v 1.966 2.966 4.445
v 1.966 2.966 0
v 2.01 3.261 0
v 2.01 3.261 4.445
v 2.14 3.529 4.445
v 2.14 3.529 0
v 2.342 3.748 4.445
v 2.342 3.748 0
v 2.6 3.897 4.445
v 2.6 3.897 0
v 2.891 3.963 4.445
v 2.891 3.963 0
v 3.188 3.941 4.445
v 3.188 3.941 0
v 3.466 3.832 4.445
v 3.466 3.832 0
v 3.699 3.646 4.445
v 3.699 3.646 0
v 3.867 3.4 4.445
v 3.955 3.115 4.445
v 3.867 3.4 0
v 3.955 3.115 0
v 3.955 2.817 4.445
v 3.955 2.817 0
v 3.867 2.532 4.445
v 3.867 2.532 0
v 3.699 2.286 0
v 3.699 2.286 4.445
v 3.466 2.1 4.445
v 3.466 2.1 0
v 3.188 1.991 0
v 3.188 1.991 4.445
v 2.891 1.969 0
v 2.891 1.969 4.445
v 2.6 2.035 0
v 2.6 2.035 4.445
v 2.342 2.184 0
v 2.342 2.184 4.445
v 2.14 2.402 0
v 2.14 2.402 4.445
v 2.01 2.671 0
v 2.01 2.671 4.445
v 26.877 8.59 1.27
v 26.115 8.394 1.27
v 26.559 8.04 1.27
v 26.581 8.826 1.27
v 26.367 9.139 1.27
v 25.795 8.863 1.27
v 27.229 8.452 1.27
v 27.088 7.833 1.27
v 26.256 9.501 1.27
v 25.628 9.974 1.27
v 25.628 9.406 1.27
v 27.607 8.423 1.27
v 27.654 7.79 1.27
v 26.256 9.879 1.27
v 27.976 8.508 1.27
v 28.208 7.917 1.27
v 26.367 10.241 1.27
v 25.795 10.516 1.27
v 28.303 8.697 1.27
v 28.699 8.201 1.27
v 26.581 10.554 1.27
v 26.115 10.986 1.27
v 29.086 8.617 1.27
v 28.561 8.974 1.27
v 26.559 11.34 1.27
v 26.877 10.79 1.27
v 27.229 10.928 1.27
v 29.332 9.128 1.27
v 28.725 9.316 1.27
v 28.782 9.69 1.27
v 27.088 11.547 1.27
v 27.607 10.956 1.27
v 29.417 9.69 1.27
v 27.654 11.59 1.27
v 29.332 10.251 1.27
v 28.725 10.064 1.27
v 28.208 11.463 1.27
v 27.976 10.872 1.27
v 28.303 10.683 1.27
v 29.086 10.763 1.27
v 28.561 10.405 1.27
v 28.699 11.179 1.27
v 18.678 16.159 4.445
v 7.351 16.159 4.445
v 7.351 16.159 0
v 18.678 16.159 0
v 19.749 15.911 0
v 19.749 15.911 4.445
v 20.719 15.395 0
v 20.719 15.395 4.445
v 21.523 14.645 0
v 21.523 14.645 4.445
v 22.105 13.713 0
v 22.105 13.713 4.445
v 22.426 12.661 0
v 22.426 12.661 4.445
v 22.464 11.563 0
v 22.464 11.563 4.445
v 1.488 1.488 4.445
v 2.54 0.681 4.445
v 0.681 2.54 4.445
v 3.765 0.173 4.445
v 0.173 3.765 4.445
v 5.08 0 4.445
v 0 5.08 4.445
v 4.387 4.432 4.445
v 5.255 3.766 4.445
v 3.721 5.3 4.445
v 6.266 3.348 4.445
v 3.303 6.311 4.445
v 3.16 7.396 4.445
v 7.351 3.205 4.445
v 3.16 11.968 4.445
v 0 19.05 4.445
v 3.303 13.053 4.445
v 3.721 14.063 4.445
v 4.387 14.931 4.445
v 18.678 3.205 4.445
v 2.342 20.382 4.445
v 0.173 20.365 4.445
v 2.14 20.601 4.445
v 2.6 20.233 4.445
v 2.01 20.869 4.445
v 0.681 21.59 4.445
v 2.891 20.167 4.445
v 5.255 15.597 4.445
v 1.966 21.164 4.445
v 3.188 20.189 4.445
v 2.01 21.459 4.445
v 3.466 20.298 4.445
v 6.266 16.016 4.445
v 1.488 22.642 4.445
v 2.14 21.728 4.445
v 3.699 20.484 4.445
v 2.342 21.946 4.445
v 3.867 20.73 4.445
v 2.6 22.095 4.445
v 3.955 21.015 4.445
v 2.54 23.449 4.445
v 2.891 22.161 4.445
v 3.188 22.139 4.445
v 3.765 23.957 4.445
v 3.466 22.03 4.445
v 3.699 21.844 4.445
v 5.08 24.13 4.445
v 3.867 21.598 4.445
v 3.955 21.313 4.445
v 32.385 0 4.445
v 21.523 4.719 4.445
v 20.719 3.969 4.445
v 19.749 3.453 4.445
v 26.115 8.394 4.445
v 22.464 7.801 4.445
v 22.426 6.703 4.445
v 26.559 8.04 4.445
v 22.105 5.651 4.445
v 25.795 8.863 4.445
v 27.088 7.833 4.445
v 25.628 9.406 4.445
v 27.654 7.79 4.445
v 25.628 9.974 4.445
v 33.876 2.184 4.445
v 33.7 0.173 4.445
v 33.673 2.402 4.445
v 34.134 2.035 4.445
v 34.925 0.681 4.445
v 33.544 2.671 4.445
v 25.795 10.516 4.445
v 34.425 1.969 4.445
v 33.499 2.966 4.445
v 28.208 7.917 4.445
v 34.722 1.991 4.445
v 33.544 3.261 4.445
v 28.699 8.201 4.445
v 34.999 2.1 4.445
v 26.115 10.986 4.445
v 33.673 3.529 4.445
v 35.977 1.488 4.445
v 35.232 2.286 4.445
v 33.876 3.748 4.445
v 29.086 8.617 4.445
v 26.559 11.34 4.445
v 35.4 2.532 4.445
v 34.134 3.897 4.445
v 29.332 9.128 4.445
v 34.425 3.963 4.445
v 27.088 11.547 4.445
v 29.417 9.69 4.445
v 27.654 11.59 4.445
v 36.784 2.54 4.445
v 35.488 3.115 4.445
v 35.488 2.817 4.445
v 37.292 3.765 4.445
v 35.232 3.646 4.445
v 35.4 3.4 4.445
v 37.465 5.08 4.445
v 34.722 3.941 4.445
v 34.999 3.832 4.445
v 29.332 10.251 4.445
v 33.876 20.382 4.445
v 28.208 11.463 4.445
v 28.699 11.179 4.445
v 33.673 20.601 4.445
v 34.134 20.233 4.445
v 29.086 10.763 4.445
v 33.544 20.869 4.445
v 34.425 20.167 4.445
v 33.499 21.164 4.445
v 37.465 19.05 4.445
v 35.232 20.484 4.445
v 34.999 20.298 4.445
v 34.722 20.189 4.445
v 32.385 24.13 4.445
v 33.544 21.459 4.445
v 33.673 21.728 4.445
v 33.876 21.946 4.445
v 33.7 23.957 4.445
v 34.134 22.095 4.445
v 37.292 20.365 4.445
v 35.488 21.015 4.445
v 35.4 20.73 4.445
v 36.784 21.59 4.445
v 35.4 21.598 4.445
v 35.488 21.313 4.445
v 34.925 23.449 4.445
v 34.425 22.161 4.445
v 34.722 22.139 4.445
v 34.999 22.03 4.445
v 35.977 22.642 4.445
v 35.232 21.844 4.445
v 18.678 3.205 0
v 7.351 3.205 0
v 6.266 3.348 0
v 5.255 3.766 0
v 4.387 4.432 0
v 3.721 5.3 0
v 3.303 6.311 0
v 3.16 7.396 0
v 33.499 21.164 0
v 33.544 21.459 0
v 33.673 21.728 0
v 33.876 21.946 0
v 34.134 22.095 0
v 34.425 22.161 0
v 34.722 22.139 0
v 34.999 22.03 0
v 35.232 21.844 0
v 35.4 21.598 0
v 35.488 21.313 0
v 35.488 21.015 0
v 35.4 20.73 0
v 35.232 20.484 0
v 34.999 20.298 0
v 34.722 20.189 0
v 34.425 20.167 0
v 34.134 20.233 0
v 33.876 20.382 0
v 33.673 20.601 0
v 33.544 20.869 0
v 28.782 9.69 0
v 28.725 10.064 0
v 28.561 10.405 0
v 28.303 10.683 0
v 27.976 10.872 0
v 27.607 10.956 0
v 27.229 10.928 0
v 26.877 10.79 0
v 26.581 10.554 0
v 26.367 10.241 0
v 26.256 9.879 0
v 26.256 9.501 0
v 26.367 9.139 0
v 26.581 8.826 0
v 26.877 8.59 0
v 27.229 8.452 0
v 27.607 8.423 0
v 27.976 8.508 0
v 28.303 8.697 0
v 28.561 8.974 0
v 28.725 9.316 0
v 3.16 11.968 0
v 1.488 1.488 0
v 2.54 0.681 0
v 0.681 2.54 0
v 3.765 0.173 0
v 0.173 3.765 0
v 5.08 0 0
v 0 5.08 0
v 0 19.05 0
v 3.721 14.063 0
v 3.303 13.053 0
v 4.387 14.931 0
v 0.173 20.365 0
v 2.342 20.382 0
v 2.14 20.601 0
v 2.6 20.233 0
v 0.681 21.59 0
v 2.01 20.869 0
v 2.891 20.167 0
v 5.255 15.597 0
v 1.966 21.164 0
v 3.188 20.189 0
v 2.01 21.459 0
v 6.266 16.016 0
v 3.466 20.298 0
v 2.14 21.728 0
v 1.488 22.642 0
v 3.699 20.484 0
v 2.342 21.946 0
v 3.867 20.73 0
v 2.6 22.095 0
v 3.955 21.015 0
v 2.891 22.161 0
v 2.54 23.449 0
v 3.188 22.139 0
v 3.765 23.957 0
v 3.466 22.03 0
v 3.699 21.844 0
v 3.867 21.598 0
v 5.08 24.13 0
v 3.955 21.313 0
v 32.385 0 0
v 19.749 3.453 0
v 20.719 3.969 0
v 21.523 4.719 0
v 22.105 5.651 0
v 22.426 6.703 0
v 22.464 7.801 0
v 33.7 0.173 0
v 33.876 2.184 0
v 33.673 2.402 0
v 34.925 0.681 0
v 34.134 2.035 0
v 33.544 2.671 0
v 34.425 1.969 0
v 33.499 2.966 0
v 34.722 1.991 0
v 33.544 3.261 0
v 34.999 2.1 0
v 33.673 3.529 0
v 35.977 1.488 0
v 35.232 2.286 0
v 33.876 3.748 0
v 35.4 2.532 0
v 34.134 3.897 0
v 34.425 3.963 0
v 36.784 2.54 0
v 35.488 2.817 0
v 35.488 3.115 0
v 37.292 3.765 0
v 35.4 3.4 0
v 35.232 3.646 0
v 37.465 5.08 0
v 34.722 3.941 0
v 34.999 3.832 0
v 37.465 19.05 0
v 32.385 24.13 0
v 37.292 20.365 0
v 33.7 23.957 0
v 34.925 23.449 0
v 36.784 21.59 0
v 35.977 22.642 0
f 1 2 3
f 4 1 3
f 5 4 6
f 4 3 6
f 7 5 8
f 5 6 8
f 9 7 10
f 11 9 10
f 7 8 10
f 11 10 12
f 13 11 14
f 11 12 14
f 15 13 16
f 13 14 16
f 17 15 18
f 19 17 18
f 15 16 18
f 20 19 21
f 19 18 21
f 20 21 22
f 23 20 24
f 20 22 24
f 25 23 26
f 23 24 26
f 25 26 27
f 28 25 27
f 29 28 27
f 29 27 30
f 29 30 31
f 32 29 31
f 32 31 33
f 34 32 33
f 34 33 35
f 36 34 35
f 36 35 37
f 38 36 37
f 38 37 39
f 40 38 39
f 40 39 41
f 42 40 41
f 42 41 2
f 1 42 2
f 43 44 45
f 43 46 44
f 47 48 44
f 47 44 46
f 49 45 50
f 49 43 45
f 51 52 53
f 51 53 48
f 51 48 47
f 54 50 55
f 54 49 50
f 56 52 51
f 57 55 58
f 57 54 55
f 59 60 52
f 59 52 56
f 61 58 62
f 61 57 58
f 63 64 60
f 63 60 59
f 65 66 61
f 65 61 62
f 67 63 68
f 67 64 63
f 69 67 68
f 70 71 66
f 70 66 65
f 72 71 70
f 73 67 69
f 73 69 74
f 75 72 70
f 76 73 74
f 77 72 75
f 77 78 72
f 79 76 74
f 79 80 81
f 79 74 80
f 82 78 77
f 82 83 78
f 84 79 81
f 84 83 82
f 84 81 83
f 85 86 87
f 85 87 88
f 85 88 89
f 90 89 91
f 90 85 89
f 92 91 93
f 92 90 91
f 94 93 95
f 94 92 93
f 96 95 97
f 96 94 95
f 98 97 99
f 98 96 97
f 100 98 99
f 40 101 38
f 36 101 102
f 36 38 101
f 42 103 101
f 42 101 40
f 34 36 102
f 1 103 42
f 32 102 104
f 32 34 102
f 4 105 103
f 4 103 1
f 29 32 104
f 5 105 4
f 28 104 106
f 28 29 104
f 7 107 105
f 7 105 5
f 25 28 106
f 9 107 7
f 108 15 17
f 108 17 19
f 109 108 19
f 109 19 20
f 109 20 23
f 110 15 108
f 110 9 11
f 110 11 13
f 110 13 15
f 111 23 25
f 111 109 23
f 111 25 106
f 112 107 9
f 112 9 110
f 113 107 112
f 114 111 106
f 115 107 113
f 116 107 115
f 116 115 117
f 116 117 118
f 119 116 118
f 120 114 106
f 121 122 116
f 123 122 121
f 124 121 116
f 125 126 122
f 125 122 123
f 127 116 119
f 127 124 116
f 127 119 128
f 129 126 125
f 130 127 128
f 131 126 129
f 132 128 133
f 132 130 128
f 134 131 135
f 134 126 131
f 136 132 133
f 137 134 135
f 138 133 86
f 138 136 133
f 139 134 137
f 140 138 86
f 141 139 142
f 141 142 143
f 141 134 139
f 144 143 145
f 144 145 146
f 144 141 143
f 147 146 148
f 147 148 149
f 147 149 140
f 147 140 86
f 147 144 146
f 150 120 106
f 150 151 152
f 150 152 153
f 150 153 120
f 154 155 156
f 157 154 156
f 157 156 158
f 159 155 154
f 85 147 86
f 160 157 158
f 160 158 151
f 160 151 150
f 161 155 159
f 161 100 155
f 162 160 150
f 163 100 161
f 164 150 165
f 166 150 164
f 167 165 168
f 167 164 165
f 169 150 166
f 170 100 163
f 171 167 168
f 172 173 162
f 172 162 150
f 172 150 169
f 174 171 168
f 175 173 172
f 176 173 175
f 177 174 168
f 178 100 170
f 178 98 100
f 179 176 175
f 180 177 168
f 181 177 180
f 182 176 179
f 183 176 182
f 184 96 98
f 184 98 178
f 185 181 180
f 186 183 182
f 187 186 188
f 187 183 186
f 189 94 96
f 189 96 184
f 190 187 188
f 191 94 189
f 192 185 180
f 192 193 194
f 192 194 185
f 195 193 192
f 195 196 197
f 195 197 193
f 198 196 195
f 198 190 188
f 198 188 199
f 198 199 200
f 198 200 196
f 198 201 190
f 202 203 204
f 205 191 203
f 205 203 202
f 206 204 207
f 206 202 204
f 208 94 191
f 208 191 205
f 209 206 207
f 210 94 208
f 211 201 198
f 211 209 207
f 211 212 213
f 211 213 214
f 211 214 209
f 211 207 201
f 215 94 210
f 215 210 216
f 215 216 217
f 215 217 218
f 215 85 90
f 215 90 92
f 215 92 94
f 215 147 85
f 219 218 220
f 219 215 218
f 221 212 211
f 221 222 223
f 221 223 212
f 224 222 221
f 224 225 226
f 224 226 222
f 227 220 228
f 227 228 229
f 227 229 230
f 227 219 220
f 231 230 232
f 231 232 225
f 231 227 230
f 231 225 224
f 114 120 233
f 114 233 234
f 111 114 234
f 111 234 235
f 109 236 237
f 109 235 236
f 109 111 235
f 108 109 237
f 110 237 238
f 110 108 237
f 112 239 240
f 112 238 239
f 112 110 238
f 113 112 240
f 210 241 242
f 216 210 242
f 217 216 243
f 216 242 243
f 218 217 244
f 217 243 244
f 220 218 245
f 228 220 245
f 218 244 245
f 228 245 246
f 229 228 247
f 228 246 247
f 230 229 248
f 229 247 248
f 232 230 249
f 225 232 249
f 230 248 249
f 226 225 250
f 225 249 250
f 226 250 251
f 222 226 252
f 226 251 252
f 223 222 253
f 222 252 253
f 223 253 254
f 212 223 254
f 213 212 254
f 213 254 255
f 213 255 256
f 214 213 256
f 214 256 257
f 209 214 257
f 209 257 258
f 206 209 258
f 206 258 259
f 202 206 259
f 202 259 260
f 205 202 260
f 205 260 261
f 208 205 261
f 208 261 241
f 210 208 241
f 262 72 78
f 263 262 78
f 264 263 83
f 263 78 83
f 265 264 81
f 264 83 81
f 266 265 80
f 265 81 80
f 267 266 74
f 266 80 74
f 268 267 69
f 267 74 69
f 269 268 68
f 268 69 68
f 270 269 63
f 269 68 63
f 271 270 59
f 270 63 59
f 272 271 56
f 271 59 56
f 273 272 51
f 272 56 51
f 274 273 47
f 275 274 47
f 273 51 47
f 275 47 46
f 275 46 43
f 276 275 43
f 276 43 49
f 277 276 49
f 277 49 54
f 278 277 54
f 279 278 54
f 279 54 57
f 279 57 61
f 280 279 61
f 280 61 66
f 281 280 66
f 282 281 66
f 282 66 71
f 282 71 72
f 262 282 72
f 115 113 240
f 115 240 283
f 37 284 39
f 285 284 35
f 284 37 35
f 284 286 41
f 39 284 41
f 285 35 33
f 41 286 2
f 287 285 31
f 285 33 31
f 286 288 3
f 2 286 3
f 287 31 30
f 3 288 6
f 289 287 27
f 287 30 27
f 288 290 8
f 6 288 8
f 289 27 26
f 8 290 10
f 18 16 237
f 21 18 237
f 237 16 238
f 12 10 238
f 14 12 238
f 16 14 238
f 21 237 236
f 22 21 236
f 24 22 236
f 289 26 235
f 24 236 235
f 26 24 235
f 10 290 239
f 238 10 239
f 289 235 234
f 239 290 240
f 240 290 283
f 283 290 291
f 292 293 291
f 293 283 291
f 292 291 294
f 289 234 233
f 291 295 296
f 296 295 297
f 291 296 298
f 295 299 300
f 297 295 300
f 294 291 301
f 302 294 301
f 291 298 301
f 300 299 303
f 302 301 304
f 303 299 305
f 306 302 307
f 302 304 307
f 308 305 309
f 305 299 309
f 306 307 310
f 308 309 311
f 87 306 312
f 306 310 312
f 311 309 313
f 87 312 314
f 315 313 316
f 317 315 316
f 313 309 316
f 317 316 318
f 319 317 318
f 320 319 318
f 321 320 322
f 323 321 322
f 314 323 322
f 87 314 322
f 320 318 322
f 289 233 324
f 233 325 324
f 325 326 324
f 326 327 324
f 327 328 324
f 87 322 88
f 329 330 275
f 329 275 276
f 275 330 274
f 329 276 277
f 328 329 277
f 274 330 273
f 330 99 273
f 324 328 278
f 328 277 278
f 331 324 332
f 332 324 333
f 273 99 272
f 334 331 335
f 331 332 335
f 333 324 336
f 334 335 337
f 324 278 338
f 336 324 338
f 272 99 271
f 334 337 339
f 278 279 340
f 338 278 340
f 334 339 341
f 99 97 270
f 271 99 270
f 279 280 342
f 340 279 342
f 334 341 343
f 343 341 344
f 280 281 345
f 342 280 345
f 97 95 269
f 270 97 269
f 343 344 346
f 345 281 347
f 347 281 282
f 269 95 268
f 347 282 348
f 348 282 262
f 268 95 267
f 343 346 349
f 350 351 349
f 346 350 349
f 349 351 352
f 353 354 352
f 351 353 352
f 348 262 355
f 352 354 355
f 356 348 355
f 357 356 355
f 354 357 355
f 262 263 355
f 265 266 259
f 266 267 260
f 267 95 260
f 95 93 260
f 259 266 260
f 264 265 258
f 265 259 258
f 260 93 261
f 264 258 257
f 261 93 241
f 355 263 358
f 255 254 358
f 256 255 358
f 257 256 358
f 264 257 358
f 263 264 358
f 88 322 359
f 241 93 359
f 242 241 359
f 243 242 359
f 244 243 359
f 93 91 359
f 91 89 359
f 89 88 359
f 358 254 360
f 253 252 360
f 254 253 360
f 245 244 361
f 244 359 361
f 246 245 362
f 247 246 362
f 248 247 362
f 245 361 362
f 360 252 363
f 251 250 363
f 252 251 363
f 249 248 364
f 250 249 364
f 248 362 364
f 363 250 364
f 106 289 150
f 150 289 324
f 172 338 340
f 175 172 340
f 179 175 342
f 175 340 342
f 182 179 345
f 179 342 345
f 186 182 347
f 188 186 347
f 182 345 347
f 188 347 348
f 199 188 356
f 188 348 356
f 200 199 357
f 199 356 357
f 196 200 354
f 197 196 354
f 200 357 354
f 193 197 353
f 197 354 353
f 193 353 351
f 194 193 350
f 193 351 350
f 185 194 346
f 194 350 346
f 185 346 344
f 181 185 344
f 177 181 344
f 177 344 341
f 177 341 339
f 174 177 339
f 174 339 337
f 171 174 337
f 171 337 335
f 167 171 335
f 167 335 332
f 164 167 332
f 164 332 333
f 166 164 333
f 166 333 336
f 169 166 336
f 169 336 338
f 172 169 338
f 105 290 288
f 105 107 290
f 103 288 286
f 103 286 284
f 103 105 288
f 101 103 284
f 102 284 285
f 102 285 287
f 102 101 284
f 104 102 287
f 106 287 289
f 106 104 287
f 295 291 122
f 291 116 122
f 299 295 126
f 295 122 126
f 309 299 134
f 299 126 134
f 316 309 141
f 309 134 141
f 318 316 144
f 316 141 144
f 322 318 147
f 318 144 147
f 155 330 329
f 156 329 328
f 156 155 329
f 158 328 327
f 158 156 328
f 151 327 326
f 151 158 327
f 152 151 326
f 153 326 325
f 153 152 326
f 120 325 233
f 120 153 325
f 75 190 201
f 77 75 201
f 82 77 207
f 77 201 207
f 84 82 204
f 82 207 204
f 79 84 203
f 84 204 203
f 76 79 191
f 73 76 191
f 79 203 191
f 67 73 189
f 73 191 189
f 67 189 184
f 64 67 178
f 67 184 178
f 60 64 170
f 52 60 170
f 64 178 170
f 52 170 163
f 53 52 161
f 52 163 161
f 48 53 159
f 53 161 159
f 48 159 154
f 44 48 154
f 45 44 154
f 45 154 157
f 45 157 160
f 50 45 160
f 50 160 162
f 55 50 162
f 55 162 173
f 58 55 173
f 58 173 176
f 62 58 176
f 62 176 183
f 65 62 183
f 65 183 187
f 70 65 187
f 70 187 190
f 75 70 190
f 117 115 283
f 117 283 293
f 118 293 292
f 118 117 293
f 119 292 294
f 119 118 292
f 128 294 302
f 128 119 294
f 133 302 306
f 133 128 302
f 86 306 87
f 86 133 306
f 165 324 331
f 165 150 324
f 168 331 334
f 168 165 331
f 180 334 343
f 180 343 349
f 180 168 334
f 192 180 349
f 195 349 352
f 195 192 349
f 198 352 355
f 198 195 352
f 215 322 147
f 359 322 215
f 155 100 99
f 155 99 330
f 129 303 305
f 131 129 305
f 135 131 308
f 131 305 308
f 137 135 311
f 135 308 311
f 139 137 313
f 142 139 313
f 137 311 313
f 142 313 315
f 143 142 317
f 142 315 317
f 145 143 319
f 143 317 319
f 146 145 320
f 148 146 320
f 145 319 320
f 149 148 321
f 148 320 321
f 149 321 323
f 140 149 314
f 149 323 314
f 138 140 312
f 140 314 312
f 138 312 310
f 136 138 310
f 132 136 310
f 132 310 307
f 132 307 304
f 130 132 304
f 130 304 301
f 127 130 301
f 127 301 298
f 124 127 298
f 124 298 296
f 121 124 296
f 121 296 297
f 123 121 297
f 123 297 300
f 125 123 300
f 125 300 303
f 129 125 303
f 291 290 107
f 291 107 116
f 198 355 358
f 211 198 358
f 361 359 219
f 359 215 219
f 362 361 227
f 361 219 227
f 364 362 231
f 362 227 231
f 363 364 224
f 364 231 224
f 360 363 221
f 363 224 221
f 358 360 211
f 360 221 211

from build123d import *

# Parameters (mm, degrees)
SKETCH1_W           = 37.465
SKETCH1_H           = 24.13
BOSS_EXTRUDE1_DEPTH = 4.445
CUT_EXTRUDE2_DEPTH  = 2.54
FILLET1_R           = 5.08
CUT_EXTRUDE4_DEPTH  = 2.54
SKETCH4_R           = 1.27
CUT_EXTRUDE5_DEPTH  = 2.54
SKETCH5_R           = 1.905
SKETCH5_R_2         = 1.27
CUT_EXTRUDE6_DEPTH  = 0.635
CUT_EXTRUDE7_DEPTH  = 2.54
BOSS_EXTRUDE2_START = 2.54
SKETCH7_R           = 1.905
BOSS_EXTRUDE2_DEPTH = 2.54
SKETCH8_R           = 1
CUT_EXTRUDE8_DEPTH  = 45.784385114


with BuildPart() as part:
    # Sketch1 → Boss-Extrude1 (new body)
    with BuildSketch(Plane.XY):
        with Locations((18.7325, 12.065)):
            Rectangle(SKETCH1_W, SKETCH1_H)
    extrude(amount=BOSS_EXTRUDE1_DEPTH)

    # Sketch2 → Cut-Extrude2 (cut)
    # profile 1 of 4: a face of its own
    with BuildSketch(Plane.XY.offset(4.445)):
        with BuildLine():
            Line((35.59175, 5.7785), (35.59175, 12.065))
            Line((35.59175, 12.065), (35.59175, 18.3515))
            ThreePointArc((35.59175, 18.3515), (34.135361545, 21.710109865), (30.681521372, 22.9235))
            Line((30.681521372, 22.9235), (18.7325, 22.9235))
            Line((18.7325, 22.9235), (6.107021372, 22.9235))
            ThreePointArc((6.107021372, 22.9235), (3.090639267, 21.470453234), (1.87325, 18.3515))
            Line((1.87325, 18.3515), (1.87325, 12.065))
            Line((1.87325, 12.065), (1.87325, 5.7785))
            ThreePointArc((1.87325, 5.7785), (3.212357796, 2.545607796), (6.44525, 1.2065))
            Line((6.44525, 1.2065), (18.7325, 1.2065))
            Line((18.7325, 1.2065), (31.01975, 1.2065))
            ThreePointArc((31.01975, 1.2065), (34.252642204, 2.545607796), (35.59175, 5.7785))
        make_face()
        with BuildLine():
            ThreePointArc((7.493, 3.175), (4.439712919, 4.439712919), (3.175, 7.493))
            Line((3.175, 7.493), (3.175, 16.637))
            ThreePointArc((3.175, 16.637), (4.317872951, 19.576666289), (7.154771372, 20.955))
            Line((7.154771372, 20.955), (7.493, 20.955))
            Line((7.493, 20.955), (29.633771372, 20.955))
            ThreePointArc((29.633771372, 20.955), (32.908147923, 19.81638289), (34.29, 16.637))
            Line((34.29, 16.637), (34.29, 7.493))
            ThreePointArc((34.29, 7.493), (33.025287081, 4.439712919), (29.972, 3.175))
            Line((29.972, 3.175), (7.493, 3.175))
        make_face(mode=Mode.SUBTRACT)
    # profile 2 of 4: a face of its own
    with BuildSketch(Plane.XY.offset(4.445)):
        with BuildLine():
            ThreePointArc((3.175, 16.637), (4.439712919, 19.690287081), (7.493, 20.955))
            Line((7.493, 20.955), (29.972, 20.955))
            ThreePointArc((29.972, 20.955), (33.025287081, 19.690287081), (34.29, 16.637))
            Line((34.29, 16.637), (34.29, 7.493))
            ThreePointArc((34.29, 7.493), (33.025287081, 4.439712919), (29.972, 3.175))
            Line((29.972, 3.175), (7.493, 3.175))
            ThreePointArc((7.493, 3.175), (4.439712919, 4.439712919), (3.175, 7.493))
            Line((3.175, 7.493), (3.175, 16.637))
        make_face()
    # profile 3 of 4: a face of its own
    with BuildSketch(Plane.XY.offset(4.445)):
        with BuildLine():
            ThreePointArc((7.154771372, 20.955), (4.317872951, 19.576666289), (3.175, 16.637))
            ThreePointArc((3.175, 16.637), (4.439712919, 19.690287081), (7.493, 20.955))
            Line((7.493, 20.955), (7.154771372, 20.955))
        make_face()
    # profile 4 of 4: a face of its own
    with BuildSketch(Plane.XY.offset(4.445)):
        with BuildLine():
            ThreePointArc((34.29, 16.637), (32.908147923, 19.81638289), (29.633771372, 20.955))
            Line((29.633771372, 20.955), (29.972, 20.955))
            ThreePointArc((29.972, 20.955), (33.025287081, 19.690287081), (34.29, 16.637))
        make_face()
    extrude(amount=-CUT_EXTRUDE2_DEPTH, mode=Mode.SUBTRACT)

    # Fillet1
    fillet1_edges = [part.edges().sort_by_distance(p)[0] for p in [
        (0, 24.13, 2.2225),
        (37.465, 24.13, 2.2225),
        (37.465, 0, 2.2225),
        (0, 0, 2.2225),
    ]]
    fillet(fillet1_edges, radius=FILLET1_R)

    # Sketch3 → Cut-Extrude4 (cut)
    with BuildSketch(Plane.XY.offset(1.905)):
        with BuildLine():
            Line((7.350869654, 16.158973759), (18.677995313, 16.158973759))
            ThreePointArc((18.677995313, 16.158973759), (21.522821275, 14.644991178), (22.463869654, 11.5628481))
            Line((22.463869654, 11.5628481), (22.463869654, 7.801099417))
            ThreePointArc((22.463869654, 7.801099417), (21.522821275, 4.718956339), (18.677995313, 3.204973759))
            Line((18.677995313, 3.204973759), (7.350869654, 3.204973759))
            ThreePointArc((7.350869654, 3.204973759), (4.387385134, 4.432489239), (3.159869654, 7.395973759))
            Line((3.159869654, 7.395973759), (3.159869654, 11.967973759))
            ThreePointArc((3.159869654, 11.967973759), (4.387385134, 14.931458278), (7.350869654, 16.158973759))
        make_face()
    extrude(amount=-CUT_EXTRUDE4_DEPTH, mode=Mode.SUBTRACT)

    # Sketch4 → Cut-Extrude5 (cut)
    with BuildSketch(Plane.XY.offset(1.905)):
        with Locations((27.511650569, 9.68988988)):
            Circle(SKETCH4_R)
    extrude(amount=-CUT_EXTRUDE5_DEPTH, mode=Mode.SUBTRACT)

    # Sketch5 → Cut-Extrude6 (cut)
    with BuildSketch(Plane.XY.offset(1.905)):
        with Locations((27.511650569, 9.68988988)):
            Circle(SKETCH5_R)
        with Locations((27.511650569, 9.68988988)):
            Circle(SKETCH5_R_2, mode=Mode.SUBTRACT)
    extrude(amount=-CUT_EXTRUDE6_DEPTH, mode=Mode.SUBTRACT)

    # Sketch6 → Cut-Extrude7 (cut)
    with BuildSketch(Plane.XY.offset(4.445)):
        with BuildLine():
            Line((1.542829573, 18.47723), (1.542829573, 5.65277))
            ThreePointArc((1.542829573, 5.65277), (2.908719525, 2.355219952), (6.206269573, 0.98933))
            Line((6.206269573, 0.98933), (31.272259573, 0.98933))
            ThreePointArc((31.272259573, 0.98933), (34.56980962, 2.355219952), (35.935699573, 5.65277))
            Line((35.935699573, 5.65277), (35.935699573, 18.47723))
            ThreePointArc((35.935699573, 18.47723), (34.450183348, 21.903012063), (30.927266372, 23.14067))
            Line((30.927266372, 23.14067), (5.861276372, 23.14067))
            ThreePointArc((5.861276372, 23.14067), (2.784566625, 21.658562299), (1.542829573, 18.47723))
        make_face()
        with BuildLine():
            Line((6.44525, 1.2065), (31.01975, 1.2065))
            ThreePointArc((31.01975, 1.2065), (34.252642204, 2.545607796), (35.59175, 5.7785))
            Line((35.59175, 5.7785), (35.59175, 18.3515))
            ThreePointArc((35.59175, 18.3515), (34.135361545, 21.710109865), (30.681521372, 22.9235))
            Line((30.681521372, 22.9235), (6.107021372, 22.9235))
            ThreePointArc((6.107021372, 22.9235), (3.090639267, 21.470453234), (1.87325, 18.3515))
            Line((1.87325, 18.3515), (1.87325, 5.7785))
            ThreePointArc((1.87325, 5.7785), (3.212357796, 2.545607796), (6.44525, 1.2065))
        make_face(mode=Mode.SUBTRACT)
    extrude(amount=-CUT_EXTRUDE7_DEPTH, mode=Mode.SUBTRACT)

    # Sketch7 → Boss-Extrude2 (add)
    with BuildSketch(Plane.XY.offset(1.905).offset(BOSS_EXTRUDE2_START)):
        with BuildLine():
            Line((1.542829573, 18.47723), (1.542829573, 5.65277))
            ThreePointArc((1.542829573, 5.65277), (2.908719525, 2.355219952), (6.206269573, 0.98933))
            Line((6.206269573, 0.98933), (31.272259573, 0.98933))
            ThreePointArc((31.272259573, 0.98933), (34.56980962, 2.355219952), (35.935699573, 5.65277))
            Line((35.935699573, 5.65277), (35.935699573, 18.47723))
            ThreePointArc((35.935699573, 18.47723), (34.450183348, 21.903012063), (30.927266372, 23.14067))
            Line((30.927266372, 23.14067), (5.861276372, 23.14067))
            ThreePointArc((5.861276372, 23.14067), (2.784566625, 21.658562299), (1.542829573, 18.47723))
        make_face()
        with Locations((27.511650569, 9.68988988)):
            Circle(SKETCH7_R, mode=Mode.SUBTRACT)
        with BuildLine():
            Line((3.159869654, 7.395973759), (3.159869654, 11.967973759))
            ThreePointArc((3.159869654, 11.967973759), (4.387385134, 14.931458278), (7.350869654, 16.158973759))
            Line((7.350869654, 16.158973759), (18.677995313, 16.158973759))
            ThreePointArc((18.677995313, 16.158973759), (21.522821275, 14.644991178), (22.463869654, 11.5628481))
            Line((22.463869654, 11.5628481), (22.463869654, 7.801099417))
            ThreePointArc((22.463869654, 7.801099417), (21.522821275, 4.718956339), (18.677995313, 3.204973759))
            Line((18.677995313, 3.204973759), (7.350869654, 3.204973759))
            ThreePointArc((7.350869654, 3.204973759), (4.387385134, 4.432489239), (3.159869654, 7.395973759))
        make_face(mode=Mode.SUBTRACT)
    extrude(amount=-BOSS_EXTRUDE2_DEPTH)

    # Sketch8 → Cut-Extrude8 (cut, through all)
    with BuildSketch(Plane(origin=(0, 0, 0), x_dir=(-1, 0, 0), z_dir=(0, 0, -1))):
        with Locations((-34.499249276, 21.164249276)):
            Circle(SKETCH8_R)
        with Locations((-34.499249276, 2.965750724)):
            Circle(SKETCH8_R)
        with Locations((-2.965750724, 2.965750724)):
            Circle(SKETCH8_R)
        with Locations((-2.965750724, 21.164249276)):
            Circle(SKETCH8_R)
    extrude(amount=-CUT_EXTRUDE8_DEPTH, mode=Mode.SUBTRACT)


solid = part.part
